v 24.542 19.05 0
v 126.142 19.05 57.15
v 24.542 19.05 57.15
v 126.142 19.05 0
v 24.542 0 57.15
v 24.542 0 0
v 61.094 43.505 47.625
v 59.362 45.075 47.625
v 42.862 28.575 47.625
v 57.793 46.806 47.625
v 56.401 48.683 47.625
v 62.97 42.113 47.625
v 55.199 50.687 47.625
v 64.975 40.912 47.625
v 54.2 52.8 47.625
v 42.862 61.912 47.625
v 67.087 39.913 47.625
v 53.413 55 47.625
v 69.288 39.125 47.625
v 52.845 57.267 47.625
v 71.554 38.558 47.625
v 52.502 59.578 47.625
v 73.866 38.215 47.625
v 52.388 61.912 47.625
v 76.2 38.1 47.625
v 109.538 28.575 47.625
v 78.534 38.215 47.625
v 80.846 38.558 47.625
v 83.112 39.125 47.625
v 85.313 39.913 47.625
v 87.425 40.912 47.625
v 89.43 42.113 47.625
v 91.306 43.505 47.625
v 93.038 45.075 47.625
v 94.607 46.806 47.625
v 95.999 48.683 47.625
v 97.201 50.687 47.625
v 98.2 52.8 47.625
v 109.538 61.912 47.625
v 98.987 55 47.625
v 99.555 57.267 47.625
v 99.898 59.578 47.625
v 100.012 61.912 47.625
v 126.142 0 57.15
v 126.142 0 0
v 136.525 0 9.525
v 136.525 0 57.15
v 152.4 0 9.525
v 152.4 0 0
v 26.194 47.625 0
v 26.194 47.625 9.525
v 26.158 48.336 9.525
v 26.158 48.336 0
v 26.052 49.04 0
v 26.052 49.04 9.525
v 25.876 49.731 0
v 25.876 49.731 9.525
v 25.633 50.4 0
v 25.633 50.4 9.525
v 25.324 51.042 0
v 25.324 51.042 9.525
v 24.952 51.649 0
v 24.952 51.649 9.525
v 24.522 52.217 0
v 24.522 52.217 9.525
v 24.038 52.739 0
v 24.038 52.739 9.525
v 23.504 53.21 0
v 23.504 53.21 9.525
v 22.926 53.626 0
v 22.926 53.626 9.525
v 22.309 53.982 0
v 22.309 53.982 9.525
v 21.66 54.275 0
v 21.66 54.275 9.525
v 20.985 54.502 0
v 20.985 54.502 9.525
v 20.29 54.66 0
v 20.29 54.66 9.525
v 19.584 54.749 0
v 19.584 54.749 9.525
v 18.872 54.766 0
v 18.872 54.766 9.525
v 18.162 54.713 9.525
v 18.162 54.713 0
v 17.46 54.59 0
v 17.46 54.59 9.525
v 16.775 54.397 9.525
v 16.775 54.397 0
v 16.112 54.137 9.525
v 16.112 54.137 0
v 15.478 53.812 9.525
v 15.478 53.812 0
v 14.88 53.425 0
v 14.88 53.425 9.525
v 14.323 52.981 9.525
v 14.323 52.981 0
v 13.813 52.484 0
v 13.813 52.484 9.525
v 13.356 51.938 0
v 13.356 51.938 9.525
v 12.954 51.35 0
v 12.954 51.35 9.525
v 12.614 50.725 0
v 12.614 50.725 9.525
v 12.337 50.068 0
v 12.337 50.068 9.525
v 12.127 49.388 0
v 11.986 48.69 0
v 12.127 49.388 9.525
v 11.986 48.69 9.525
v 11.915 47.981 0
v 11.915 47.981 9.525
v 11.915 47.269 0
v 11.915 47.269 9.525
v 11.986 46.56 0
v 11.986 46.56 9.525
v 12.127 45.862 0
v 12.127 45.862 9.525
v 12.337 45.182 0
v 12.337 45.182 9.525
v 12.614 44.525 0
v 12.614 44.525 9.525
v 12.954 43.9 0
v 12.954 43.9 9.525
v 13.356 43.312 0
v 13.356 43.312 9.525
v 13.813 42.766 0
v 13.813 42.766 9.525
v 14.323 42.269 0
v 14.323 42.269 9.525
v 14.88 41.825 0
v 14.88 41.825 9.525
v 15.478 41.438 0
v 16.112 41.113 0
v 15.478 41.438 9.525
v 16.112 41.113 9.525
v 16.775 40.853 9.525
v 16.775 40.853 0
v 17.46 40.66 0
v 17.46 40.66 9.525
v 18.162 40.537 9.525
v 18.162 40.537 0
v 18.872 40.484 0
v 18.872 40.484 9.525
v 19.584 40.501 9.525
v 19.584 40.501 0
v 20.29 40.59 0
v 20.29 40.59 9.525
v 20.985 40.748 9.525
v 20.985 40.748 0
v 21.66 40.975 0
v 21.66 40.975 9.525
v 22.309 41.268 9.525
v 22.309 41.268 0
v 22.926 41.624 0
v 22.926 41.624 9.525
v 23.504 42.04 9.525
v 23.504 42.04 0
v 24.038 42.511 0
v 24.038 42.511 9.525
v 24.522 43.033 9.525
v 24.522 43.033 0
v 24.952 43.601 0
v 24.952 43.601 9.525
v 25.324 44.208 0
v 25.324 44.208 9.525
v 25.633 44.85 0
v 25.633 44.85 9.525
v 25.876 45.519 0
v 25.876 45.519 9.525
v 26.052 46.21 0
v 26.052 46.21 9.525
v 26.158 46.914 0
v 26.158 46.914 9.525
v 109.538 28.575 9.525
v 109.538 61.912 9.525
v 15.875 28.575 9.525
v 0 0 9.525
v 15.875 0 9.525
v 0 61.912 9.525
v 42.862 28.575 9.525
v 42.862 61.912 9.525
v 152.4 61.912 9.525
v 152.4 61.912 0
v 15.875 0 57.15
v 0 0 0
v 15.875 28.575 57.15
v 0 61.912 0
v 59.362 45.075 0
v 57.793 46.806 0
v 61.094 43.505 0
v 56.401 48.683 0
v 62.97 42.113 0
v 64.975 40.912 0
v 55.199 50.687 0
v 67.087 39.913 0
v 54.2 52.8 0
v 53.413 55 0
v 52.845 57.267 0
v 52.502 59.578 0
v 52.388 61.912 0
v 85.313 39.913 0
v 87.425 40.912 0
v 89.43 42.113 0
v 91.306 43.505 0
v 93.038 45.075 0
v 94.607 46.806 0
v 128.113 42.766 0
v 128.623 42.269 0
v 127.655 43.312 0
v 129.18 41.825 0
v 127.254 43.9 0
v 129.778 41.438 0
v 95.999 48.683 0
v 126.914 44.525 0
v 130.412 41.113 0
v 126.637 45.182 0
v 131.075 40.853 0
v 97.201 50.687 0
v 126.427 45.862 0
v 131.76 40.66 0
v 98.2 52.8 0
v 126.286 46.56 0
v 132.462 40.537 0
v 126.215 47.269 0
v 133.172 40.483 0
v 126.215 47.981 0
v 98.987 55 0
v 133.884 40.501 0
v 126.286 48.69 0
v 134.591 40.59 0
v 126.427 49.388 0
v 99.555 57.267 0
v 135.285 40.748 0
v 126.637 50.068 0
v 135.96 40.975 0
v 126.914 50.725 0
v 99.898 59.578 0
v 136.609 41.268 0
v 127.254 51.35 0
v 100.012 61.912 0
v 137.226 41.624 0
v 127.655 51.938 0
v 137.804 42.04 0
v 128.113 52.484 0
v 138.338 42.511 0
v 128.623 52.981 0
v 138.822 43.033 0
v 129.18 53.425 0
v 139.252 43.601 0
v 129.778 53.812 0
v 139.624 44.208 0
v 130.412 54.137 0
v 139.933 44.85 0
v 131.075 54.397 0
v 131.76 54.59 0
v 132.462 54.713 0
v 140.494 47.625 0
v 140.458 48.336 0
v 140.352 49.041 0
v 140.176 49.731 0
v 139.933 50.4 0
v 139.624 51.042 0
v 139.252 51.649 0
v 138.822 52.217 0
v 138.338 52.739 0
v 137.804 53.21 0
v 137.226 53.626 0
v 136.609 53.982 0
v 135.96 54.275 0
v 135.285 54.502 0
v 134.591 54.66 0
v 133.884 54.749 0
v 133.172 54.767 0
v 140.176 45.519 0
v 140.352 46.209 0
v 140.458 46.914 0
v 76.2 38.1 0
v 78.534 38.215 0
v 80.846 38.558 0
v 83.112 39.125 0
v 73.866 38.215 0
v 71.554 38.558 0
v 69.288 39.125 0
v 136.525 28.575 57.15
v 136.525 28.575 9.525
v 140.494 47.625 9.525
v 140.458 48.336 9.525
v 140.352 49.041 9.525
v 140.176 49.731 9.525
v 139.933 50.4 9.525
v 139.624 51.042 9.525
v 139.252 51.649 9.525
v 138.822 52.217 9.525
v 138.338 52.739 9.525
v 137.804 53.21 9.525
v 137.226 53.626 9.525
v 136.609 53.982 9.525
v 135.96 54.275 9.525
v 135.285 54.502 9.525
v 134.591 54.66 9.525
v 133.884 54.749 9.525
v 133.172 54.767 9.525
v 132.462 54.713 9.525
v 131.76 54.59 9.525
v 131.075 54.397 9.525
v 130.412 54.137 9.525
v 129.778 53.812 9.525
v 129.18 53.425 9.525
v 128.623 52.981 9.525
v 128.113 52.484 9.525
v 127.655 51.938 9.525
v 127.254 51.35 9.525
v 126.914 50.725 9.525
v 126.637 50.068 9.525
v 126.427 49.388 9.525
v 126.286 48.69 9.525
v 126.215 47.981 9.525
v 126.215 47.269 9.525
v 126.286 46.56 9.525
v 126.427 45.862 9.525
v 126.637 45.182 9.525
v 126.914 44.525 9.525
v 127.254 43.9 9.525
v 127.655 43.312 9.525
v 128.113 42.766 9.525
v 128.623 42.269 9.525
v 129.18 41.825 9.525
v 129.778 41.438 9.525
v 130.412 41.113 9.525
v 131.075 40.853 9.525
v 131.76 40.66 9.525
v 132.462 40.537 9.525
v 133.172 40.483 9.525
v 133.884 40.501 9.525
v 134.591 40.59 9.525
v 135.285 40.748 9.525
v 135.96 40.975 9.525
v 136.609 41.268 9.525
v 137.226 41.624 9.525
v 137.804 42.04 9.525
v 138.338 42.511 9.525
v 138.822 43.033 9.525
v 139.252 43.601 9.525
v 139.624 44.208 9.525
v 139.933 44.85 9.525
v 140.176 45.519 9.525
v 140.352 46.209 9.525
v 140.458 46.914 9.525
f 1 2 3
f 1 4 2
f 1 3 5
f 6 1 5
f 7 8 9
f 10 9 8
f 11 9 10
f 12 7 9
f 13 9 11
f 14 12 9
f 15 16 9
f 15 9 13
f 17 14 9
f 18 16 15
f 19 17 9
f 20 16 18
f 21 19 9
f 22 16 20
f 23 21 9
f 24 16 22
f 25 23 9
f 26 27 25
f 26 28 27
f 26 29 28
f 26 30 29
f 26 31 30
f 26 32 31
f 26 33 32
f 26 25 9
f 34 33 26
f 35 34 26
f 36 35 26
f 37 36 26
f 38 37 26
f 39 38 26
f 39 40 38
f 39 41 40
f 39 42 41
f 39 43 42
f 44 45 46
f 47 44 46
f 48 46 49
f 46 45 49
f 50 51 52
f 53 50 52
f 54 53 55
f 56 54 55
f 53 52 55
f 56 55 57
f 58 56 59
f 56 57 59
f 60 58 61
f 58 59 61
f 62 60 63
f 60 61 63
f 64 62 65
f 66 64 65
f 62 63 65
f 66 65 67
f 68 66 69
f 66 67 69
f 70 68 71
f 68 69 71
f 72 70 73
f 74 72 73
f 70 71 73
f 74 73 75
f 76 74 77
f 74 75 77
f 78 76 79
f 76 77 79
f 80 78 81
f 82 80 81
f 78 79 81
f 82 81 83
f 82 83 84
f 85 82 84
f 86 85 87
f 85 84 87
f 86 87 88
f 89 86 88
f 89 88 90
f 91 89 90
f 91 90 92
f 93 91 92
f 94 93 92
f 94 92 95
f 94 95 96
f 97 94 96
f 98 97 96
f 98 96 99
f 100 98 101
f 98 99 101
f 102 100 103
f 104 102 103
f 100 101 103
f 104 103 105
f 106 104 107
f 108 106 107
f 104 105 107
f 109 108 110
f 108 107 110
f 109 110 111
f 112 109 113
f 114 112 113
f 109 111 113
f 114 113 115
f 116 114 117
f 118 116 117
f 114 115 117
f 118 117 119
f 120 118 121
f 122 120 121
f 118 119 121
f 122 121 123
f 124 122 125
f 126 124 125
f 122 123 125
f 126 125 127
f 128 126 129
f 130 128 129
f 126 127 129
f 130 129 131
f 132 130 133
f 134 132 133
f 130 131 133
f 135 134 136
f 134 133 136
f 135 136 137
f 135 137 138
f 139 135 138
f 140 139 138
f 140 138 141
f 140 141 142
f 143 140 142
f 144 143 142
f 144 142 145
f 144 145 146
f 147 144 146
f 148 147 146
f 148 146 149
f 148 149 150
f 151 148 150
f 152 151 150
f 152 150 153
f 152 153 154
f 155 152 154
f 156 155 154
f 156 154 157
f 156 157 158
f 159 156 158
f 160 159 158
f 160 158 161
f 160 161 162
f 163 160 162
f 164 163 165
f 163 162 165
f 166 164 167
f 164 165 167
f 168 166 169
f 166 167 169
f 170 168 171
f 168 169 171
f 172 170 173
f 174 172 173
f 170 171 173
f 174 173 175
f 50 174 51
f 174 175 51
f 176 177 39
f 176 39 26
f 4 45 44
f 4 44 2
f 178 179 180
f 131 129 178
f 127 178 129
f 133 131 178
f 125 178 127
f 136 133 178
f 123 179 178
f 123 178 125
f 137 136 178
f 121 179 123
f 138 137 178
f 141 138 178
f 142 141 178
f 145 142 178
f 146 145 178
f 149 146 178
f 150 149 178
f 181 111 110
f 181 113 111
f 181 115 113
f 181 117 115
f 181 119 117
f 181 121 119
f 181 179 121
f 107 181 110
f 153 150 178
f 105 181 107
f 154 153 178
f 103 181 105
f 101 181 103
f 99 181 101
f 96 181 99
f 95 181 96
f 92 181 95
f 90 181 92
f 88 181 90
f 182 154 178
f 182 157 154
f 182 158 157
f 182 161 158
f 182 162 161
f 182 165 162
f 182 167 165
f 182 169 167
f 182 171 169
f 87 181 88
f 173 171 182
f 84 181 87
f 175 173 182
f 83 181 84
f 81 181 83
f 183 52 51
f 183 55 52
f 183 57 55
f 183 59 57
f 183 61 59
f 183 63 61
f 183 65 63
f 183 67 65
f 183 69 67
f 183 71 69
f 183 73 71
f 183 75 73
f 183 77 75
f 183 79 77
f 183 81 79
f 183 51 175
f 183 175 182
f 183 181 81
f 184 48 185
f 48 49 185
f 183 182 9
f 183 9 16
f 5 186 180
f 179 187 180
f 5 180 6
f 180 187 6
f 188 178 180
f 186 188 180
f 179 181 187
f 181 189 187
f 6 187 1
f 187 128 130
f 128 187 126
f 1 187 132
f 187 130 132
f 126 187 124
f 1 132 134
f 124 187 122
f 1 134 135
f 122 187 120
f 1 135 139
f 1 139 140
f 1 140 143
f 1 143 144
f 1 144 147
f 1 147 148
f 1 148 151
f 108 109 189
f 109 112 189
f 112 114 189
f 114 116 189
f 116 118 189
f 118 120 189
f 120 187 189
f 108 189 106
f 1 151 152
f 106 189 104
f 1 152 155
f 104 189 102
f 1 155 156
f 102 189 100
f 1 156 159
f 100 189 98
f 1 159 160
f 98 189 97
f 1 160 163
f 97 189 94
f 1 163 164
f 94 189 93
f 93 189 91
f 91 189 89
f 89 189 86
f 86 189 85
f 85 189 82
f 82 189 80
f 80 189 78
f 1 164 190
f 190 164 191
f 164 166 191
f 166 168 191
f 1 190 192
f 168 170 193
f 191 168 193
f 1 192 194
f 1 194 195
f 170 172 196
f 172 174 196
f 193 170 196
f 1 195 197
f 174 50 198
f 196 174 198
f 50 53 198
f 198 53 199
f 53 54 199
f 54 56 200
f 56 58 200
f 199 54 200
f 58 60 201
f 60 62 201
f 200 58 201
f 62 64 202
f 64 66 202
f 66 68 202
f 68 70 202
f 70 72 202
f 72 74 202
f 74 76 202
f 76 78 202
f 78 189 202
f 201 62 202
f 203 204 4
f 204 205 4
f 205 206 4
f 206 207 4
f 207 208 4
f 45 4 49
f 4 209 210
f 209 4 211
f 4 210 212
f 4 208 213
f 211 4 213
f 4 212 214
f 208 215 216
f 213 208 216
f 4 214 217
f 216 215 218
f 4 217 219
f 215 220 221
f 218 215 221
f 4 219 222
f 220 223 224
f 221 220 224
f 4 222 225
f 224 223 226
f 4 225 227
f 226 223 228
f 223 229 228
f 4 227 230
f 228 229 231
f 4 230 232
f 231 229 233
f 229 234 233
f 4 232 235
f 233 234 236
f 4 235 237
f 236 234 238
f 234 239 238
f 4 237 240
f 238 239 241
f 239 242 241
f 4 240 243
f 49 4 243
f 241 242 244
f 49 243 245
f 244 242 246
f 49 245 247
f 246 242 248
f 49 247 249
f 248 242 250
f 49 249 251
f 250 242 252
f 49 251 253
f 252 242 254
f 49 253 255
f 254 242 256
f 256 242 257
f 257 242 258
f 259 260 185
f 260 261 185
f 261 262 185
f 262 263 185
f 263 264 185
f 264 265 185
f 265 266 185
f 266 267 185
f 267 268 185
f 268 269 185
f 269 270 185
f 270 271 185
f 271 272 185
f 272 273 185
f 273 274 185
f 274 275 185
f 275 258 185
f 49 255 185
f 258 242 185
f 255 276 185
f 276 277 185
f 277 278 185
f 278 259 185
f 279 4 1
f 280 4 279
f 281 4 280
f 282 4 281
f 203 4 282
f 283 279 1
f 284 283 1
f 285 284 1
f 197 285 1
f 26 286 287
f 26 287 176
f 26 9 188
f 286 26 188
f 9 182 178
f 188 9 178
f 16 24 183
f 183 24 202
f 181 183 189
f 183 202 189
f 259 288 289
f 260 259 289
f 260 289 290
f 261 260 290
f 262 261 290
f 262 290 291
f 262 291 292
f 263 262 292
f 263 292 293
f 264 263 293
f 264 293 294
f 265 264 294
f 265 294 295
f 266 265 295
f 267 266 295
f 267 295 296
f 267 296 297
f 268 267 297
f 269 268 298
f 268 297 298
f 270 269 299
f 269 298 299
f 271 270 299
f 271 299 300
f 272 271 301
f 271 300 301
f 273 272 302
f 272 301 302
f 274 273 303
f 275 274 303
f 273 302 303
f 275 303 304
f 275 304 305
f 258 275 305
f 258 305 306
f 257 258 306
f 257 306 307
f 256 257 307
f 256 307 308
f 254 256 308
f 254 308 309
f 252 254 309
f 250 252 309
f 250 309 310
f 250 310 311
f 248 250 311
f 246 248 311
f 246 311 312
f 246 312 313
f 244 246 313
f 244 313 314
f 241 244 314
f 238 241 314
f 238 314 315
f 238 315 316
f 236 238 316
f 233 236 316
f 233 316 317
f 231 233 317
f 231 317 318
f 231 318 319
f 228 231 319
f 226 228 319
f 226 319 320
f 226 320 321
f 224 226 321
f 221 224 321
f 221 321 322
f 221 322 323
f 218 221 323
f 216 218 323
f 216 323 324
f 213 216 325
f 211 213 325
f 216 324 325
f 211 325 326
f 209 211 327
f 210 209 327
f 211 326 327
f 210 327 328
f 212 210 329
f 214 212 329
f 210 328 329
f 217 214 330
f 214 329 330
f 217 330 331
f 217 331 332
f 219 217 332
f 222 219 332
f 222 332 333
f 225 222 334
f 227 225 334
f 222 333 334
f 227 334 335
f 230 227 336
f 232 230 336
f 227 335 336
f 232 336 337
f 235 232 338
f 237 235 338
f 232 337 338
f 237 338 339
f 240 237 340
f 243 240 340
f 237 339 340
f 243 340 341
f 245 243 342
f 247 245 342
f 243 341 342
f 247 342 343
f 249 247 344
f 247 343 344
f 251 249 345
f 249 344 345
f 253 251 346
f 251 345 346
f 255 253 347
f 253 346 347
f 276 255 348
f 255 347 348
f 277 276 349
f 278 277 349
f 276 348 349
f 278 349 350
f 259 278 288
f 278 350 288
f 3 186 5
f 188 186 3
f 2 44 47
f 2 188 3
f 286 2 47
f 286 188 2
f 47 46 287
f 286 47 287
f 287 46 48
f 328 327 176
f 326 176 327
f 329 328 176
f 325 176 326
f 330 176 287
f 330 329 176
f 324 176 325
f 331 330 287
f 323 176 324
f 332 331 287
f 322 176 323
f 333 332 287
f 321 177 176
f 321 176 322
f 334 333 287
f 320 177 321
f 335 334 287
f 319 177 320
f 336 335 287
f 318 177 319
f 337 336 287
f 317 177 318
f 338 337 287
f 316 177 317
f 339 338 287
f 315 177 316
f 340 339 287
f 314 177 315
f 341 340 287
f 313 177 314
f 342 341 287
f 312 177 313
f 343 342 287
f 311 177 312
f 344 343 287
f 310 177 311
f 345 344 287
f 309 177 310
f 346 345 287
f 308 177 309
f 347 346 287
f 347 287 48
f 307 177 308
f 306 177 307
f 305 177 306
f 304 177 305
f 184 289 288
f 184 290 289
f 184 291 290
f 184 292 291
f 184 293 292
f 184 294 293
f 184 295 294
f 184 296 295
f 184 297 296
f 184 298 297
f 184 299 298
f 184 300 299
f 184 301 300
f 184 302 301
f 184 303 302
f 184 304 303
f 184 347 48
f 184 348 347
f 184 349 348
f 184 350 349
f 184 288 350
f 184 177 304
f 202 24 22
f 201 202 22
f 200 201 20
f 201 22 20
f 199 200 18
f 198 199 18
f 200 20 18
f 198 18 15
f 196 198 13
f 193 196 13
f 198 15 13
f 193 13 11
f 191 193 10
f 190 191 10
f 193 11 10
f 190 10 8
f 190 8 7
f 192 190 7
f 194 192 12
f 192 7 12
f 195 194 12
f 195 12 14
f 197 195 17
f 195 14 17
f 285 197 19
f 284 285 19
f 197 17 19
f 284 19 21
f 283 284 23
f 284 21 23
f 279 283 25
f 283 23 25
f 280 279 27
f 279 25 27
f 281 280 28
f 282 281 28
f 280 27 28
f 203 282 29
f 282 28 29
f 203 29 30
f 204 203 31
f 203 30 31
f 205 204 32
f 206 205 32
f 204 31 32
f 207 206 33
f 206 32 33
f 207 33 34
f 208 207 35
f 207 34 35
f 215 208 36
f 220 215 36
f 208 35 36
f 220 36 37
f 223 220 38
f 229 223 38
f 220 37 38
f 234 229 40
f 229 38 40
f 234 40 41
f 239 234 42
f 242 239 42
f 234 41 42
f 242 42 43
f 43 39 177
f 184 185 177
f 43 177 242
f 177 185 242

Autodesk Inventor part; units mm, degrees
ref_plane "YZ Plane" through (0, 0, 0) normal (1, 0, 0) x (0, 1, 0)
ref_plane "XZ Plane" through (0, 0, 0) normal (0, 1, 0) x (-1, 0, 0)
ref_plane "XY Plane" through (0, 0, 0) normal (0, 0, 1) x (1, 0, 0)
sketch "Boceto1" plane through (0, 0, 0) normal (0, 0, 1) x (1, 0, 0)
  line L0 (0, 0) -> (152.4, 0)
  line L1 (152.4, 0) -> (152.4, 61.9125)
  line L2 (152.4, 61.9125) -> (0, 61.9125)
  line L3 (0, 61.9125) -> (0, 0)
  dimension "d0" = 152.4
  dimension "d1" = 61.9125
extrude "Bloque_Posterior" add sketch "Boceto1" along normal blind 9.525
sketch "Boceto2" plane through (0, 0, 9.525) normal (0, 0, 1) x (1, 0, 0)
  line L0 (15.875, 0) -> (136.525, 0)
  line L1 (136.525, 0) -> (136.525, 28.575)
  line L2 (136.525, 28.575) -> (15.875, 28.575)
  line L3 (15.875, 28.575) -> (15.875, 0)
  line L4 (0, 0) -> (152.4, 0) projected
  line L5 (76.2, 0) -> (76.2, 70.6909) construction
  dimension "d4" = 120.65
  dimension "d5" = 28.575
  dimension "d6" = 60.325
extrude "Bloque_Inferior" add sketch "Boceto2" along normal blind 47.625
sketch "Boceto3" plane through (0, 0, 9.525) normal (0, 0, 1) x (1, 0, 0)
  line L0 (0, 0) -> (152.4, 0) projected
  line L1 (76.2, 0) -> (76.2, 86.7708) construction
  line L2 (42.8625, 61.9125) -> (109.5375, 61.9125)
  line L3 (109.5375, 61.9125) -> (109.5375, 28.575)
  line L4 (109.5375, 28.575) -> (42.8625, 28.575)
  line L5 (42.8625, 28.575) -> (42.8625, 61.9125)
  line L6 (152.4, 61.9125) -> (0, 61.9125) projected
  dimension "d9" = 66.675
  dimension "d10" = 33.3375
  dimension "d11" = 33.3375
extrude "Bloque_Superior" add sketch "Boceto3" along normal blind 38.1
sketch "Boceto4" plane through (0, 0, 9.525) normal (0, 0, 1) x (1, 0, 0)
  line L0 (0, 0) -> (152.4, 0) projected
  line L1 (24.5425, 0) -> (126.1425, 0)
  line L2 (126.1425, 0) -> (126.1425, 19.05)
  line L3 (126.1425, 19.05) -> (24.5425, 19.05)
  line L4 (24.5425, 19.05) -> (24.5425, 0)
  dimension "d14" = 101.6
  dimension "d15" = 19.05
extrude "Orificio_Inferior" cut sketch "Boceto4" along normal blind 47.625 and the other way blind 23.8252
sketch "Boceto5" plane through (0, 0, 47.625) normal (0, 0, 1) x (1, 0, 0)
  line L0 (109.5375, 61.9125) -> (42.8625, 61.9125) projected
  arc A0 (52.3875, 61.9125) -> (100.0125, 61.9125) centre (76.2, 61.9125) ccw
  point P0 (0, 0)
  dimension "d20" = 47.625
extrude "Agujero_Central" cut sketch "Boceto5" against normal blind 47.625
sketch "Boceto6" plane through (0, 0, 9.525) normal (0, 0, 1) x (1, 0, 0)
  line L0 (-22.923, 47.625) -> (163.4069, 47.625) construction
  line L1 (19.05, -6.8102) -> (19.05, 78.4252) construction
  line L2 (42.8625, 61.9125) -> (0, 61.9125) projected
  line L3 (0, 61.9125) -> (0, 0) projected
  circle A0 centre (19.05, 47.625) radius 7.1437
  dimension "d23" = 14.2875
  dimension "d24" = 19.05
  dimension "d25" = 14.2875
extrude "Agujero_Izquierdo" cut sketch "Boceto6" against normal blind 9.525
sketch "Boceto7" plane through (0, 0, 9.525) normal (0, 0, 1) x (1, 0, 0)
  line L0 (133.35, 81.3516) -> (133.35, -20.5289) construction
  line L1 (173.8284, 47.625) -> (-5.5853, 47.625) construction
  line L2 (152.4, 0) -> (152.4, 61.9125) projected
  line L3 (152.4, 61.9125) -> (109.5375, 61.9125) projected
  circle A0 centre (133.35, 47.625) radius 7.1438
  point P0 (0, 0)
  dimension "d28" = 19.05
  dimension "d29" = 14.2875
  dimension "d30" = 14.2875
extrude "Agujero_Derecho" cut sketch "Boceto7" against normal blind 9.525
